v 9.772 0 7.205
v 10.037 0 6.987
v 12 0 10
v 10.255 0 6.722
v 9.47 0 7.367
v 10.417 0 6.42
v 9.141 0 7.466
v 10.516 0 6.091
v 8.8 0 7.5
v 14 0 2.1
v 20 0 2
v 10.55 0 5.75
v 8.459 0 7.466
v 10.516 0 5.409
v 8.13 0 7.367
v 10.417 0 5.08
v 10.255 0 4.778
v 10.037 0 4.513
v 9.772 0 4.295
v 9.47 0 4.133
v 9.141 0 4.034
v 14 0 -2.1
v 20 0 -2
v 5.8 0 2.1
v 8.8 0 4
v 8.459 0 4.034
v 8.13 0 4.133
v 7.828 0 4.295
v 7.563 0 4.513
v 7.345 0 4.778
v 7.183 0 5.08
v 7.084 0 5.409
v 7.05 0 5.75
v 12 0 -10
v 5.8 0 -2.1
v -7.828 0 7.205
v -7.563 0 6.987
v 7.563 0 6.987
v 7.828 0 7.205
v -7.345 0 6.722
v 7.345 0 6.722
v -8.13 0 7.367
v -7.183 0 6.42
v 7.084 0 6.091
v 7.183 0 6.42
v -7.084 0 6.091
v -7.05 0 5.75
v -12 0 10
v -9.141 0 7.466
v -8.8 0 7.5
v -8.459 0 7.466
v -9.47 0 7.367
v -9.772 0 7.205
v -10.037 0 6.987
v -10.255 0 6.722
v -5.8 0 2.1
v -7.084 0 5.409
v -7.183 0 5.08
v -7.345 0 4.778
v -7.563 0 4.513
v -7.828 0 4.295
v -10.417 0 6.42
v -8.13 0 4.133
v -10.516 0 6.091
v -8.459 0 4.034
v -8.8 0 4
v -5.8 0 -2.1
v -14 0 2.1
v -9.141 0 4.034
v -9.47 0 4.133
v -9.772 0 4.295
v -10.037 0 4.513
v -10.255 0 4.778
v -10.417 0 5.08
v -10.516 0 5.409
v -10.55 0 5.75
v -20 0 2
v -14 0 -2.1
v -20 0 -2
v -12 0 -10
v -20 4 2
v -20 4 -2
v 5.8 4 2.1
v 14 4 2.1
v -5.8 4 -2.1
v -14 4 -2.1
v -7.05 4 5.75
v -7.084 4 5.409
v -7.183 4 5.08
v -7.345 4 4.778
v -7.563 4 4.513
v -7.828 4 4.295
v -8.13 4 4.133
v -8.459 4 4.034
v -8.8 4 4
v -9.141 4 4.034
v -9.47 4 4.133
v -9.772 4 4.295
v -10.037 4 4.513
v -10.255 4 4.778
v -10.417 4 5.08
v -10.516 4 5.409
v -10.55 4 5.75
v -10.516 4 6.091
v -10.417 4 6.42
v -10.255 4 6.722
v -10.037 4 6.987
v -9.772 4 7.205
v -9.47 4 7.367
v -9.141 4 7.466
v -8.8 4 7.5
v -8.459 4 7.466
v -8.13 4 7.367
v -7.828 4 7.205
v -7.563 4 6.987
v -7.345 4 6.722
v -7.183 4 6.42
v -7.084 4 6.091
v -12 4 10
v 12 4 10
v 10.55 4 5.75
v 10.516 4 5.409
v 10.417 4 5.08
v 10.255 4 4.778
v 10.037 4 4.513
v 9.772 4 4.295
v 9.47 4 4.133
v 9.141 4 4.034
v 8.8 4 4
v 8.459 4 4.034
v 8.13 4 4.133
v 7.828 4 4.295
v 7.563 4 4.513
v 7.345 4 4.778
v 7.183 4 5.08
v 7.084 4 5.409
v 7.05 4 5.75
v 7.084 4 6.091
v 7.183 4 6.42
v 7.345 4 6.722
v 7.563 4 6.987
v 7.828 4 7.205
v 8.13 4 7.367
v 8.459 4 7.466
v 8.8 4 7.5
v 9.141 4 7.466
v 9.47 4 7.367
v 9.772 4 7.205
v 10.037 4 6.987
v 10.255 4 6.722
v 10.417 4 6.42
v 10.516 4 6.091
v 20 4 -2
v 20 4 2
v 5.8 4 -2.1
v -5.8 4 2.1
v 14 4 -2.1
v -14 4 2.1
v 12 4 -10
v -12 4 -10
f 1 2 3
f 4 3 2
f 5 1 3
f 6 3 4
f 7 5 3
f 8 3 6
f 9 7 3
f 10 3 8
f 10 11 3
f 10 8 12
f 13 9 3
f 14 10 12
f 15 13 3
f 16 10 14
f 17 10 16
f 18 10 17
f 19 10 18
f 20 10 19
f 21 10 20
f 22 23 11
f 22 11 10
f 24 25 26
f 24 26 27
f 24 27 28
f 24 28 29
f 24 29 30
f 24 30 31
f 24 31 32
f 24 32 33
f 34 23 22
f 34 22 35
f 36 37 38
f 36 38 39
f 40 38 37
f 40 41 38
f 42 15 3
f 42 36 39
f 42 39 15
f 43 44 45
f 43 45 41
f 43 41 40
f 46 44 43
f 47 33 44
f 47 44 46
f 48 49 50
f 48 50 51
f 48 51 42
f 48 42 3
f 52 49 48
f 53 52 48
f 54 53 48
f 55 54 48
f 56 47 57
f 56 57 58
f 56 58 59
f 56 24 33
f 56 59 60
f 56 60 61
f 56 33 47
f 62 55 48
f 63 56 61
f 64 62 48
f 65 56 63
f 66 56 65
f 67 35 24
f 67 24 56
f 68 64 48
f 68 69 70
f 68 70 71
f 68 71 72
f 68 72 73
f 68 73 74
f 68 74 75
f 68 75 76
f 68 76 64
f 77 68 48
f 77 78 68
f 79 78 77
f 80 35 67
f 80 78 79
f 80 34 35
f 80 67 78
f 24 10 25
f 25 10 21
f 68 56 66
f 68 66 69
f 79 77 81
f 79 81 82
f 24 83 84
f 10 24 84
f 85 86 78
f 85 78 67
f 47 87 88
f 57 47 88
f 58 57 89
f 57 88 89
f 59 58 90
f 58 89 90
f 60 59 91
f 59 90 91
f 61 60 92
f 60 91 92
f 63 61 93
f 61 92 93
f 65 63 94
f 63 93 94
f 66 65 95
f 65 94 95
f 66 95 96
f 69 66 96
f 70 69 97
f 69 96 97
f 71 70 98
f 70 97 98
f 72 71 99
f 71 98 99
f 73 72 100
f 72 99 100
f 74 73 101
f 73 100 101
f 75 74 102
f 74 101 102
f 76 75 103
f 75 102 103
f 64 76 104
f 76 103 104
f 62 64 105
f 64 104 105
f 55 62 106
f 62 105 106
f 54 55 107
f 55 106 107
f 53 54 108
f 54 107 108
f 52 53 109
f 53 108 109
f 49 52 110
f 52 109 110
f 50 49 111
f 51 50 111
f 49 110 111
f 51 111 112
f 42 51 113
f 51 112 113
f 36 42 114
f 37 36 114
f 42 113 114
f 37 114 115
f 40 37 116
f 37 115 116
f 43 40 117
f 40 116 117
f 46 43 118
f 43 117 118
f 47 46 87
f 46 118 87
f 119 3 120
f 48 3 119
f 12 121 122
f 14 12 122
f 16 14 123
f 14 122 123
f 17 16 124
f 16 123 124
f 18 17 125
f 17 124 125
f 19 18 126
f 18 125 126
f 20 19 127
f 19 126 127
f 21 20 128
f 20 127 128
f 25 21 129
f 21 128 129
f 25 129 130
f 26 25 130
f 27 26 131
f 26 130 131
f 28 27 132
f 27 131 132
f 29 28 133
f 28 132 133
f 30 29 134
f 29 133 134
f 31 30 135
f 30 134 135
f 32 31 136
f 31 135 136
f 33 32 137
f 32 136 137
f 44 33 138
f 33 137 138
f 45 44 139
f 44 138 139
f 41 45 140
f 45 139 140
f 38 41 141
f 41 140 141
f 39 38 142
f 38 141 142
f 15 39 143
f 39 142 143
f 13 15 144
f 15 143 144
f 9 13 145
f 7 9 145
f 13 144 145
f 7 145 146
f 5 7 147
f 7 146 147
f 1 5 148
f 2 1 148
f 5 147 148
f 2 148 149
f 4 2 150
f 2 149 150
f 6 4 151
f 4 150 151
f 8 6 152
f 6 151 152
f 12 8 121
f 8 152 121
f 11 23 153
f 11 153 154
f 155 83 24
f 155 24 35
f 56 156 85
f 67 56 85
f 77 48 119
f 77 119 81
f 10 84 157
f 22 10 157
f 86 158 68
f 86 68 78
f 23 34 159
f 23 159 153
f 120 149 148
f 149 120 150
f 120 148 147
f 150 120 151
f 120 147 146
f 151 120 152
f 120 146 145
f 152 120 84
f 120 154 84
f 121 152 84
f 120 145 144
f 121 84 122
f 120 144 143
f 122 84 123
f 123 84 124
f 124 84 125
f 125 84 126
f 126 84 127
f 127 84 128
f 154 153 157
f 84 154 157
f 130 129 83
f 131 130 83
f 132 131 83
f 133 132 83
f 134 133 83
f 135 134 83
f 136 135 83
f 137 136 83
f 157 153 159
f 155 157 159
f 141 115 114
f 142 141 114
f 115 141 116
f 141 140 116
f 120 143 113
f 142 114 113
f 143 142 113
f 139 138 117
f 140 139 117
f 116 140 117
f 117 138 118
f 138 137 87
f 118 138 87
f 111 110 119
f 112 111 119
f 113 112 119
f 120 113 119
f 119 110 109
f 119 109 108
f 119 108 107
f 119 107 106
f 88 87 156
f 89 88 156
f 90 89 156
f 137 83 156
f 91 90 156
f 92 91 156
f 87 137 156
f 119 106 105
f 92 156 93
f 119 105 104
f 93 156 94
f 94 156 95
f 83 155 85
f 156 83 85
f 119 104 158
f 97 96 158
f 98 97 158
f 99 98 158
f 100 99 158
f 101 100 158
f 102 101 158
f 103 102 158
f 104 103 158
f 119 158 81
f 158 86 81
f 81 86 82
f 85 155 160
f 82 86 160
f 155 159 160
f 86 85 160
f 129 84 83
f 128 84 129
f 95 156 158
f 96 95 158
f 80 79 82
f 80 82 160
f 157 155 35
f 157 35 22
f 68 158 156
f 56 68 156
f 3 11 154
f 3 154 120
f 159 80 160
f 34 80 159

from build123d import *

# Parameters (mm, degrees)
BOSS_EXTRUDE1_DEPTH = 4
SKETCH2_W           = 8.2
SKETCH2_H           = 4.2
CUT_EXTRUDE1_DEPTH  = 4
SKETCH3_R           = 1.75
CUT_EXTRUDE2_DEPTH  = 4


with BuildPart() as part:
    # Sketch1 → Boss-Extrude1 (new body)
    with BuildSketch(Plane(origin=(0, 0, 0), x_dir=(1, 0, 0), z_dir=(0, 1, 0))):
        Polygon((12, -10), (-12, -10), (-20, -2), (-20, 2), (-12, 10), (12, 10), (20, 2), (20, -2), align=None)
    extrude(amount=BOSS_EXTRUDE1_DEPTH)

    # Sketch2 → Cut-Extrude1 (cut)
    with BuildSketch(Plane(origin=(0, 4, 0), x_dir=(1, 0, 0), z_dir=(0, 1, 0))):
        with Locations((9.9, 0)):
            Rectangle(SKETCH2_W, SKETCH2_H)
        with Locations((-9.9, 0)):
            Rectangle(SKETCH2_W, SKETCH2_H)
    extrude(amount=-CUT_EXTRUDE1_DEPTH, mode=Mode.SUBTRACT)

    # Sketch3 → Cut-Extrude2 (cut)
    with BuildSketch(Plane(origin=(0, 4, 0), x_dir=(1, 0, 0), z_dir=(0, 1, 0))):
        with Locations((-8.8, -5.75)):
            Circle(SKETCH3_R)
        with Locations((8.8, -5.75)):
            Circle(SKETCH3_R)
    extrude(amount=-CUT_EXTRUDE2_DEPTH, mode=Mode.SUBTRACT)


solid = part.part
